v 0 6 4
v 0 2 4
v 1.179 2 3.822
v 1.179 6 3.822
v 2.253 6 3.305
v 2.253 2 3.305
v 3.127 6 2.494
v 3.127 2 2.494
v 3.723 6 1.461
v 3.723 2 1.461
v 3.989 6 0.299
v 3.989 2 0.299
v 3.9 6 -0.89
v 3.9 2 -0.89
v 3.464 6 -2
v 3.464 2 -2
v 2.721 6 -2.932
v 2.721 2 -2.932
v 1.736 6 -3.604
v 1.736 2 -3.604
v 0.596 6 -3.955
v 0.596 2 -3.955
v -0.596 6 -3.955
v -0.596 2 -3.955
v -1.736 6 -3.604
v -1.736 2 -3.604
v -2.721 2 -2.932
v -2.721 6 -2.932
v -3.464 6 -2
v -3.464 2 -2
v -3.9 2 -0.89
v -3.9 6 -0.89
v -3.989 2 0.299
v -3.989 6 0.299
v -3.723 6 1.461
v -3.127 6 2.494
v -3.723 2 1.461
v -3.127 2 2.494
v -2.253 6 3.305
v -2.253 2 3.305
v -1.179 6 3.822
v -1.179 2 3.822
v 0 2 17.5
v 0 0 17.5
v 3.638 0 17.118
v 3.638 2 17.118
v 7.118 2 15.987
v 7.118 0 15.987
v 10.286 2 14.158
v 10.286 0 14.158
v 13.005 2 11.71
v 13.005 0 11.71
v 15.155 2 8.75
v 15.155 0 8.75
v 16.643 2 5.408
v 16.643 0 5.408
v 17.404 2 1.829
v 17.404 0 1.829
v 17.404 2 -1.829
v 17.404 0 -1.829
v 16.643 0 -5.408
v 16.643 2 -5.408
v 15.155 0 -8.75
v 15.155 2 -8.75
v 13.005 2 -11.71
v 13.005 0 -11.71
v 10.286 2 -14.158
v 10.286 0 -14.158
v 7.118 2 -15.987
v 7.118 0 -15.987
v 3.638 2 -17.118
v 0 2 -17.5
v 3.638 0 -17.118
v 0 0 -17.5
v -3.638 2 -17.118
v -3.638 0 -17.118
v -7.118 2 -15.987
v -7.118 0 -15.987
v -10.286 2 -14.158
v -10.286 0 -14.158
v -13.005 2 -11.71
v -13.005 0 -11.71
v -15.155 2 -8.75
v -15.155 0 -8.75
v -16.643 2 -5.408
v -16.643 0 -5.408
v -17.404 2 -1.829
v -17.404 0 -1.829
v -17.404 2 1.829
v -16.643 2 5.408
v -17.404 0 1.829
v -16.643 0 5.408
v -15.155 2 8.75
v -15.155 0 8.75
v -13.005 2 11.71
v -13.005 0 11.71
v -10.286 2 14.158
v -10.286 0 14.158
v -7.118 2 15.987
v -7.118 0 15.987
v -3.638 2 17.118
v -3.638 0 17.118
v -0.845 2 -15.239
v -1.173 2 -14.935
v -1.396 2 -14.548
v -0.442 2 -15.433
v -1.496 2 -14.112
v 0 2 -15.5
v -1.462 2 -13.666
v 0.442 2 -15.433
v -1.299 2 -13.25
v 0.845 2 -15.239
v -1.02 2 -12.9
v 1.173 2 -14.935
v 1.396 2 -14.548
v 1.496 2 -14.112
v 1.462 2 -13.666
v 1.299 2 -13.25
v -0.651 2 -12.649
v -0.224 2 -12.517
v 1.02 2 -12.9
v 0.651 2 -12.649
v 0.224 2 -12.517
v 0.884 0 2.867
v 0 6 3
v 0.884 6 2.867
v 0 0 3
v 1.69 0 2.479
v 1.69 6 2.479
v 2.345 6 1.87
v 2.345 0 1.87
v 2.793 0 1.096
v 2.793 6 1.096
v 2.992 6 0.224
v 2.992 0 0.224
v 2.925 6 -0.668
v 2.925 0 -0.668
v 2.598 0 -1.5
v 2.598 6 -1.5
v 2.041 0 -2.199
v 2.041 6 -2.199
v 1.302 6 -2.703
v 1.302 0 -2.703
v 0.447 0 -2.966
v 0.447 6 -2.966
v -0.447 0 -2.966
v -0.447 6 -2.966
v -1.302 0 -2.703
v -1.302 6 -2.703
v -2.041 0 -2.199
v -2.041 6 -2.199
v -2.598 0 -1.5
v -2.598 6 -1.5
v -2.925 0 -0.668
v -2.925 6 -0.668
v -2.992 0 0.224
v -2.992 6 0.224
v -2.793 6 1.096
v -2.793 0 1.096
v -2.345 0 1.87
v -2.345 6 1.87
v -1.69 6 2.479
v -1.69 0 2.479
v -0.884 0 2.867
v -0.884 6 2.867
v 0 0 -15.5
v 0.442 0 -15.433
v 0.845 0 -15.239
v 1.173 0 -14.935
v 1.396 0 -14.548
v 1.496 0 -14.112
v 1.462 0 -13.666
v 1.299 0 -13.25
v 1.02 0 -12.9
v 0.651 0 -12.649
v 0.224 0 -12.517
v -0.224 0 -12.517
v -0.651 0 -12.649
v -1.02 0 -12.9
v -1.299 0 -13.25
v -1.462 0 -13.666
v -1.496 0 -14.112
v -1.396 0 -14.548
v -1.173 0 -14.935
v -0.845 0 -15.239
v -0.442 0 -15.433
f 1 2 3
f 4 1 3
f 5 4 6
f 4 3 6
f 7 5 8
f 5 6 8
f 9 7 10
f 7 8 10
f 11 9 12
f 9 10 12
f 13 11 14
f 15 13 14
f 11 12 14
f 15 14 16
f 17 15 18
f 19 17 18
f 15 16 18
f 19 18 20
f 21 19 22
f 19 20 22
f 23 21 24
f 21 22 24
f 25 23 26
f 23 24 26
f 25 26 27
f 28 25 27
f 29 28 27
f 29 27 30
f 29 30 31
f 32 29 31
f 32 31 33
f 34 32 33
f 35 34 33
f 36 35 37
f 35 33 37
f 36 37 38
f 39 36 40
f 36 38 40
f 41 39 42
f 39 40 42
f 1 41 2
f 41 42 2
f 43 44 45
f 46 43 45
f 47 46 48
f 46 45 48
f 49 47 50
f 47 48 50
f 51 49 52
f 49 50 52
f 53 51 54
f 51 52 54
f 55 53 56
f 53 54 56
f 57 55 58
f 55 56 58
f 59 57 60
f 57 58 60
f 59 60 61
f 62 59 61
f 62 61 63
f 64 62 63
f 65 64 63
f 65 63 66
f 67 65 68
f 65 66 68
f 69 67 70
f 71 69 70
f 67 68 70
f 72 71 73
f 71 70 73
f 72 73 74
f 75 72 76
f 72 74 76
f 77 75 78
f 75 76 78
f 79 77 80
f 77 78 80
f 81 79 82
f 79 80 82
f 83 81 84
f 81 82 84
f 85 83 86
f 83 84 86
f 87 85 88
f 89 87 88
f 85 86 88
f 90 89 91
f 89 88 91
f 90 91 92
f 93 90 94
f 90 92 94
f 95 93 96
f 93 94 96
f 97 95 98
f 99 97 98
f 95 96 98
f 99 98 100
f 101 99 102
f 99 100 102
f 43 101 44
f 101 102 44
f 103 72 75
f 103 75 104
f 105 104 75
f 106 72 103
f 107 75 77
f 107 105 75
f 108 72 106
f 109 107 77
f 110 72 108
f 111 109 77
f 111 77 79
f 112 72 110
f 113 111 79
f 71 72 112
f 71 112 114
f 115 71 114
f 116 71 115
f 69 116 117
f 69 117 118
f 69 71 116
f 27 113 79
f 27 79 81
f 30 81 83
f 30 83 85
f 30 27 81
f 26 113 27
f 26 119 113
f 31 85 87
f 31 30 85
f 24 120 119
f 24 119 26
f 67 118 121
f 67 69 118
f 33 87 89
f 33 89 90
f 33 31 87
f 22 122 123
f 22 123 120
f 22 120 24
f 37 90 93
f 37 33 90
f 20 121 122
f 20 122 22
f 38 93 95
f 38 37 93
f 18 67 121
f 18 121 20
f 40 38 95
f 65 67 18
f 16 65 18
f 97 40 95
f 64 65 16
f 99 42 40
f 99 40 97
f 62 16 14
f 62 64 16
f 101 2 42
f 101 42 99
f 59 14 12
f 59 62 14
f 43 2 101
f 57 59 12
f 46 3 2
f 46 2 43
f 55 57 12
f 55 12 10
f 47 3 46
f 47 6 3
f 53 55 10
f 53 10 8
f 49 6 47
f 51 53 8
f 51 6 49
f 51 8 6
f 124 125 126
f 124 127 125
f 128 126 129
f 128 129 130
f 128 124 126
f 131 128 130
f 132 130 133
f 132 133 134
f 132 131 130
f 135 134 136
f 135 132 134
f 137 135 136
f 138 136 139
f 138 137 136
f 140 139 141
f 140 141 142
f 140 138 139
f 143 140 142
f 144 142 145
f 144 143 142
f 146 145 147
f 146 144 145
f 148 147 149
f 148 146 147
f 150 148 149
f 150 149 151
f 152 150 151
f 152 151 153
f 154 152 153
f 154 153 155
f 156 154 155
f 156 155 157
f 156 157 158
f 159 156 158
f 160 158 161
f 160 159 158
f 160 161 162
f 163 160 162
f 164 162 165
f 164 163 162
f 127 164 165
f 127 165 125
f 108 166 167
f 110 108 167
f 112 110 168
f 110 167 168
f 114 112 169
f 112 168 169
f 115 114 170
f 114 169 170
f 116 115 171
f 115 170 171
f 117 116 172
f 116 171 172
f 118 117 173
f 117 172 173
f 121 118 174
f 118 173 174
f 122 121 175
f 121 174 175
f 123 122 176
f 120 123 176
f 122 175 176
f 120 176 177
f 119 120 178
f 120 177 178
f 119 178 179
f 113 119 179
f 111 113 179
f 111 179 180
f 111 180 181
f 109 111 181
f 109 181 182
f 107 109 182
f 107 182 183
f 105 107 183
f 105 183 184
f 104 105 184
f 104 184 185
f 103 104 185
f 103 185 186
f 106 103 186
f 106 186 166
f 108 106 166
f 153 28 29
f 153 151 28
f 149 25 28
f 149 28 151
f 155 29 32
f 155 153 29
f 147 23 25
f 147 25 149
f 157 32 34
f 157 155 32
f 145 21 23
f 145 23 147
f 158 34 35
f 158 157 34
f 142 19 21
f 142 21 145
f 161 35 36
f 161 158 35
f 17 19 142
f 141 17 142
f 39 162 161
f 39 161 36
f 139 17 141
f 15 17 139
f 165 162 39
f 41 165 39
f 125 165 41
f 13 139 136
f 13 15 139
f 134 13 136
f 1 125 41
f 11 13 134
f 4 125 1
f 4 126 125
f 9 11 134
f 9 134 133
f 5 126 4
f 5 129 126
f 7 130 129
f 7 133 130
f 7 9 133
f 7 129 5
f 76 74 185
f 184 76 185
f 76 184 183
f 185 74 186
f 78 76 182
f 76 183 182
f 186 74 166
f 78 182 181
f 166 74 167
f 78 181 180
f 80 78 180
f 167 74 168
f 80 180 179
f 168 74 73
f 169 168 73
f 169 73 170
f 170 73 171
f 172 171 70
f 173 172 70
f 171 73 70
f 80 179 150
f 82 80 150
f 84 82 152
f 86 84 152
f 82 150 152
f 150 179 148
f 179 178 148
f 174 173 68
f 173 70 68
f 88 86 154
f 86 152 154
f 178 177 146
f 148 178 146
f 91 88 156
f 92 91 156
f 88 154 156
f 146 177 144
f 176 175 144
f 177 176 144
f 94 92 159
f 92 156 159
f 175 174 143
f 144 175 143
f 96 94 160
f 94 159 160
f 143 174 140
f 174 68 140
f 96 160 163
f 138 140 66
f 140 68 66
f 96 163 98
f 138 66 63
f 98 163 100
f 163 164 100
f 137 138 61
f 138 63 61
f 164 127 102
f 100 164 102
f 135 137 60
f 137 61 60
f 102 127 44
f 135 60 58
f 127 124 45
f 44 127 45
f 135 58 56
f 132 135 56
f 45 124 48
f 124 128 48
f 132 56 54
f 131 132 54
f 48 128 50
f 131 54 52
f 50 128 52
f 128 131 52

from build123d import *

# Parameters (mm, degrees)
SKETCH1_R                   = 17.5
SKETCH1_R_2                 = 3
BOSS_EXTRUDE1_DEPTH         = 2
IZIM1_R                     = 4
IZIM1_R_2                   = 3
Y_KSEKLIK_EKSTR_ZYON1_DEPTH = 4
CUT_EXTRUDE1_REACH          = 27.466
SKETCH2_R                   = 1.5


with BuildPart() as part:
    # Sketch1 → Boss-Extrude1 (new body)
    with BuildSketch(Plane(origin=(0, 0, 0), x_dir=(1, 0, 0), z_dir=(0, 1, 0))):
        with Locations(Location((0, 0, 0), (0, 0, 270))):
            Circle(SKETCH1_R)
        with Locations(Location((0, 0, 0), (0, 0, 270))):
            Circle(SKETCH1_R_2, mode=Mode.SUBTRACT)
    extrude(amount=BOSS_EXTRUDE1_DEPTH)

    # Çizim1 → Yükseklik-Ekstrüzyon1 (add)
    with BuildSketch(Plane(origin=(0, 2, 0), x_dir=(1, 0, 0), z_dir=(0, 1, 0))):
        with Locations(Location((0, 0, 0), (0, 0, 270))):
            Circle(IZIM1_R)
        with Locations(Location((0, 0, 0), (0, 0, 270))):
            Circle(IZIM1_R_2, mode=Mode.SUBTRACT)
    extrude(amount=Y_KSEKLIK_EKSTR_ZYON1_DEPTH)

    # Sketch2 → Cut-Extrude1 (cut, up to next)
    with BuildSketch(Plane.XZ, mode=Mode.PRIVATE) as cut_extrude1_sk1:
        with Locations(Location((0, -14, 0), (0, 0, 270))):
            Circle(SKETCH2_R)
    cut_extrude1_tool1 = extrude(cut_extrude1_sk1.sketch, amount=-CUT_EXTRUDE1_REACH, mode=Mode.PRIVATE) & part.part
    add(cut_extrude1_tool1.solids().sort_by_distance((0, 0, -14))[0], mode=Mode.SUBTRACT)


solid = part.part
